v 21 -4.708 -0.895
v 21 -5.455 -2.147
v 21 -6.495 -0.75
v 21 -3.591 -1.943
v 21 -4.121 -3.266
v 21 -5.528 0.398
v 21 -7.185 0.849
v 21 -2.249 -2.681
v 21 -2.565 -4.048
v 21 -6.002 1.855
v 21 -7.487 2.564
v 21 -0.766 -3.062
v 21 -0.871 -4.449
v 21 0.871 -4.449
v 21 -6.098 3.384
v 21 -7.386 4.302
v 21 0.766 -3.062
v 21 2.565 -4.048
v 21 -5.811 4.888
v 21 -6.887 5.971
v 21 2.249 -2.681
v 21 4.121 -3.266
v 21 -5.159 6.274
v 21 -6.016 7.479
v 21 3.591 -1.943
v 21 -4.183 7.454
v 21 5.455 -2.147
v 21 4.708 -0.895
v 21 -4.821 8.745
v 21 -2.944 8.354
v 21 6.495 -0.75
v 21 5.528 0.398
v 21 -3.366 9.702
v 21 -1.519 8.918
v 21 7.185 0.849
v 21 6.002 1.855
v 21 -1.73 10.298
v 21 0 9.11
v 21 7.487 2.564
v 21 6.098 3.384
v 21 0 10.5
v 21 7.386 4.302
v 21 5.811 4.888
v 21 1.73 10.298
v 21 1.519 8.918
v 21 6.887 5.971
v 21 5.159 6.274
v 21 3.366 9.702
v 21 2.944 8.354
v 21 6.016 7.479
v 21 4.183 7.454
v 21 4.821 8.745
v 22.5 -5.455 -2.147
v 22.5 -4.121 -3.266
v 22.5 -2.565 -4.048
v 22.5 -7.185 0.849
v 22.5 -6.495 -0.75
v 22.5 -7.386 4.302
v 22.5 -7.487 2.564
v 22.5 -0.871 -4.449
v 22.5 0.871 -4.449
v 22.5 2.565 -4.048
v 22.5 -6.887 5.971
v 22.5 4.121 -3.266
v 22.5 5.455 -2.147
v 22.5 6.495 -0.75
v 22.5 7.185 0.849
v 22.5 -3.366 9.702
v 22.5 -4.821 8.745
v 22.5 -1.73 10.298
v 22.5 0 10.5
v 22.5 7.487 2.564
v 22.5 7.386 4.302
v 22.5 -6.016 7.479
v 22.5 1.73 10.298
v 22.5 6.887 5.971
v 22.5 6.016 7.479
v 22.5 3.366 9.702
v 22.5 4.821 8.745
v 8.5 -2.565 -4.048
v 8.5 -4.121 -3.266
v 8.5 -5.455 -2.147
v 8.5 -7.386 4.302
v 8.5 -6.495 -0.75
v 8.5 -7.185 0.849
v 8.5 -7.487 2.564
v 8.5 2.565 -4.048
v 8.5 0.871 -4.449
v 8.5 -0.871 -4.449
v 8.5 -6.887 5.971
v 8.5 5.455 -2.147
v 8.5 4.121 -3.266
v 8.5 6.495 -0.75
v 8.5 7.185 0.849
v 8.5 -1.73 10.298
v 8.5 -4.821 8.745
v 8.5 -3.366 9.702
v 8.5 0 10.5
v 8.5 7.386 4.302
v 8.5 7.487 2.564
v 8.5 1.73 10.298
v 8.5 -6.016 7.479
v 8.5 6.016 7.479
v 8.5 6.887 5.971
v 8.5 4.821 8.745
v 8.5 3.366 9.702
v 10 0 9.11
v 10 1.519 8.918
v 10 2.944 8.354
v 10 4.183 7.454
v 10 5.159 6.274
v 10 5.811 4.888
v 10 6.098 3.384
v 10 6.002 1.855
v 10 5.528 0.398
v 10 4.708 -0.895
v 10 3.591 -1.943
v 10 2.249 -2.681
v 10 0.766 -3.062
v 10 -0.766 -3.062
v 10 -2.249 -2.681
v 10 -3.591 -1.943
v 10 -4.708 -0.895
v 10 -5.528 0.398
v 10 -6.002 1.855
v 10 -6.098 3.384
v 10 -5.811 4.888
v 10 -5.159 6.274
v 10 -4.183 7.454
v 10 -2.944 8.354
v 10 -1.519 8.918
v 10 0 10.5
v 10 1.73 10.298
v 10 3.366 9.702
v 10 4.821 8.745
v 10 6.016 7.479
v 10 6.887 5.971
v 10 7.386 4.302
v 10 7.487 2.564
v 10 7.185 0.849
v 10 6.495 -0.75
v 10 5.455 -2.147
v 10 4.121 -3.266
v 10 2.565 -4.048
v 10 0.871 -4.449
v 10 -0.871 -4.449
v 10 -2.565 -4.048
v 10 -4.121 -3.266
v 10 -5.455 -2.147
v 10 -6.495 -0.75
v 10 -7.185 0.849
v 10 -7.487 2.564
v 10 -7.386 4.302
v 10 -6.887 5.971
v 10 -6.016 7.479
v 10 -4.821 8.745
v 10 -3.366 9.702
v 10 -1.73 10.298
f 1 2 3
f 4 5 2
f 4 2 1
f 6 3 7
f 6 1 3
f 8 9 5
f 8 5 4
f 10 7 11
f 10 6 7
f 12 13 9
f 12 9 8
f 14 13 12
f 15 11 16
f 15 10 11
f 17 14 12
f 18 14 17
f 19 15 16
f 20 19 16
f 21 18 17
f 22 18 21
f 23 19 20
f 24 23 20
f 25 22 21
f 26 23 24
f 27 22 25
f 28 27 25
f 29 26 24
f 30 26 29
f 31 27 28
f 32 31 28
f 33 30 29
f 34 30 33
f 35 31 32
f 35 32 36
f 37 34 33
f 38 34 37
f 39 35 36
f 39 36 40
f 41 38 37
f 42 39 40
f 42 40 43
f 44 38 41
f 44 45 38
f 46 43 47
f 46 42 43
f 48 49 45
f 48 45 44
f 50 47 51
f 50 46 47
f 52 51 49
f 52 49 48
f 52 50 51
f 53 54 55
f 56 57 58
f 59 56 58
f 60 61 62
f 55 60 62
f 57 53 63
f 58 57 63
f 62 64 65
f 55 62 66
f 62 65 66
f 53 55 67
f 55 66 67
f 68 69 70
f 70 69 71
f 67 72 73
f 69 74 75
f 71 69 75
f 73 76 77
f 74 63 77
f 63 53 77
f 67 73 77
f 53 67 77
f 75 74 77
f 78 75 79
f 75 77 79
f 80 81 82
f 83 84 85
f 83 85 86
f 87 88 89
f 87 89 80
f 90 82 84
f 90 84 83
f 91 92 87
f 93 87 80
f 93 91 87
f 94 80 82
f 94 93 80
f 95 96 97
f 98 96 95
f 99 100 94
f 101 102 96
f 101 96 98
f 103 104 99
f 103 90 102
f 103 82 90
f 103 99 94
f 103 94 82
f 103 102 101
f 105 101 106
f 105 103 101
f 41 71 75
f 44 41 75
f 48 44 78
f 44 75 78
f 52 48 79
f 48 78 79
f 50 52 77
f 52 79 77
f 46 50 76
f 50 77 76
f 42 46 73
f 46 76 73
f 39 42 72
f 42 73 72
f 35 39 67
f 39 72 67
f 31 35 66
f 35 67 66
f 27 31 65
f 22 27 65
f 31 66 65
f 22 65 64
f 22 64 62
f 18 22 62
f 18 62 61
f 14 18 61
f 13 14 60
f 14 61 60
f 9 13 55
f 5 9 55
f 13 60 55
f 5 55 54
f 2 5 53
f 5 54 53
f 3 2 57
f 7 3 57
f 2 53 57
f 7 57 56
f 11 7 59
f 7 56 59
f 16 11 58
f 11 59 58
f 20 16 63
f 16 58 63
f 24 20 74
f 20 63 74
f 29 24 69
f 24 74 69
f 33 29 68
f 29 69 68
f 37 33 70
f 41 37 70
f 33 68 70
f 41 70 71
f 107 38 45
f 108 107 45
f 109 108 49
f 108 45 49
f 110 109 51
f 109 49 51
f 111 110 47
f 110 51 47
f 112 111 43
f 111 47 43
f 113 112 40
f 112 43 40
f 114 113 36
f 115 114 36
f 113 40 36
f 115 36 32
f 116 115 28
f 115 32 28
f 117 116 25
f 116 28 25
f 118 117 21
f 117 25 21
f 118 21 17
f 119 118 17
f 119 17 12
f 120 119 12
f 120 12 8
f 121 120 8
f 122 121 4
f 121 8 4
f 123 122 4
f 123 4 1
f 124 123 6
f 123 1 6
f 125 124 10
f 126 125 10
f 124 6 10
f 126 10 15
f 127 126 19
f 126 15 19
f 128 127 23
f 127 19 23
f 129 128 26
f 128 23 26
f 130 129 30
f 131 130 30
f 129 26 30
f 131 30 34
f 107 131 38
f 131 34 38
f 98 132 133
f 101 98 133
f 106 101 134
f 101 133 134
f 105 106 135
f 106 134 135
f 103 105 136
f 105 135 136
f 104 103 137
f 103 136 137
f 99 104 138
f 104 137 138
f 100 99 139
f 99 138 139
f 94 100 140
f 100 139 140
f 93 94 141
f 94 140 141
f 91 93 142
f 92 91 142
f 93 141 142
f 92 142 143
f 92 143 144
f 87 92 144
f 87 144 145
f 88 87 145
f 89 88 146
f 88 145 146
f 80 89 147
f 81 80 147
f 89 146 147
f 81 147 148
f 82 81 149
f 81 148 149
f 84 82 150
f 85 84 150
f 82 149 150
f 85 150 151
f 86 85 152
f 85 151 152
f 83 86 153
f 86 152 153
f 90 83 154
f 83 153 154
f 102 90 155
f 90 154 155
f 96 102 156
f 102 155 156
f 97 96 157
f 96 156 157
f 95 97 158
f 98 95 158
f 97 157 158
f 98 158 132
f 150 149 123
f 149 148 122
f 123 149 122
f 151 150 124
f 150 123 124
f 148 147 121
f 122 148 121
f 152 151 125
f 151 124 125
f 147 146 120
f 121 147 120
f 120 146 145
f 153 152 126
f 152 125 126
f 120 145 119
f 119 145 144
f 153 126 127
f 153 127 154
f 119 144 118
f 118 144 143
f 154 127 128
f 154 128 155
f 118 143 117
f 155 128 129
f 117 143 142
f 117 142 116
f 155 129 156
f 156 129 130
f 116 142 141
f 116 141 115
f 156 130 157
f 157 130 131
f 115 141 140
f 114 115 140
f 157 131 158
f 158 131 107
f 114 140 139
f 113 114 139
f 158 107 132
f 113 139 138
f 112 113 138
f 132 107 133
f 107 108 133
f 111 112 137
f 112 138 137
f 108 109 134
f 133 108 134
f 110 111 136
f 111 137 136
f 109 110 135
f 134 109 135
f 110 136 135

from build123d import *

# Parameters (mm, degrees)
CYLINDER012_R     = 7.5
CYLINDER012_DEPTH = 1.5
CYLINDER011_R     = 6.11
CYLINDER011_DEPTH = 11
CYLINDER013_R     = 7.5
CYLINDER013_DEPTH = 1.5


with BuildPart() as cylinder012:
    # Cylinder012 → Cylinder012 (new body)
    with BuildSketch(Plane.ZY.offset(5.5)):
        Circle(CYLINDER012_R)
    extrude(amount=CYLINDER012_DEPTH)


with BuildPart() as cylinder011:
    # Cylinder011 → Cylinder011 (new body)
    with BuildSketch(Plane.ZY.offset(-5.5)):
        Circle(CYLINDER011_R)
    extrude(amount=CYLINDER011_DEPTH)


with BuildPart() as f_20t_9mm_pulley:
    # Cylinder013 → Cylinder013 (new body)
    with BuildSketch(Plane.ZY.offset(-7)):
        Circle(CYLINDER013_R)
    extrude(amount=CYLINDER013_DEPTH)

    # Fusion013005011003: union Cylinder012, Cylinder011
    add(cylinder012.part)
    add(cylinder011.part)


with BuildPart() as f_20t_9mm_pulley_1:
    # Fusion013005011003 placement: moved
    add(f_20t_9mm_pulley.part.moved(Location((15.5, 0, 3))))


solid = f_20t_9mm_pulley_1.part
